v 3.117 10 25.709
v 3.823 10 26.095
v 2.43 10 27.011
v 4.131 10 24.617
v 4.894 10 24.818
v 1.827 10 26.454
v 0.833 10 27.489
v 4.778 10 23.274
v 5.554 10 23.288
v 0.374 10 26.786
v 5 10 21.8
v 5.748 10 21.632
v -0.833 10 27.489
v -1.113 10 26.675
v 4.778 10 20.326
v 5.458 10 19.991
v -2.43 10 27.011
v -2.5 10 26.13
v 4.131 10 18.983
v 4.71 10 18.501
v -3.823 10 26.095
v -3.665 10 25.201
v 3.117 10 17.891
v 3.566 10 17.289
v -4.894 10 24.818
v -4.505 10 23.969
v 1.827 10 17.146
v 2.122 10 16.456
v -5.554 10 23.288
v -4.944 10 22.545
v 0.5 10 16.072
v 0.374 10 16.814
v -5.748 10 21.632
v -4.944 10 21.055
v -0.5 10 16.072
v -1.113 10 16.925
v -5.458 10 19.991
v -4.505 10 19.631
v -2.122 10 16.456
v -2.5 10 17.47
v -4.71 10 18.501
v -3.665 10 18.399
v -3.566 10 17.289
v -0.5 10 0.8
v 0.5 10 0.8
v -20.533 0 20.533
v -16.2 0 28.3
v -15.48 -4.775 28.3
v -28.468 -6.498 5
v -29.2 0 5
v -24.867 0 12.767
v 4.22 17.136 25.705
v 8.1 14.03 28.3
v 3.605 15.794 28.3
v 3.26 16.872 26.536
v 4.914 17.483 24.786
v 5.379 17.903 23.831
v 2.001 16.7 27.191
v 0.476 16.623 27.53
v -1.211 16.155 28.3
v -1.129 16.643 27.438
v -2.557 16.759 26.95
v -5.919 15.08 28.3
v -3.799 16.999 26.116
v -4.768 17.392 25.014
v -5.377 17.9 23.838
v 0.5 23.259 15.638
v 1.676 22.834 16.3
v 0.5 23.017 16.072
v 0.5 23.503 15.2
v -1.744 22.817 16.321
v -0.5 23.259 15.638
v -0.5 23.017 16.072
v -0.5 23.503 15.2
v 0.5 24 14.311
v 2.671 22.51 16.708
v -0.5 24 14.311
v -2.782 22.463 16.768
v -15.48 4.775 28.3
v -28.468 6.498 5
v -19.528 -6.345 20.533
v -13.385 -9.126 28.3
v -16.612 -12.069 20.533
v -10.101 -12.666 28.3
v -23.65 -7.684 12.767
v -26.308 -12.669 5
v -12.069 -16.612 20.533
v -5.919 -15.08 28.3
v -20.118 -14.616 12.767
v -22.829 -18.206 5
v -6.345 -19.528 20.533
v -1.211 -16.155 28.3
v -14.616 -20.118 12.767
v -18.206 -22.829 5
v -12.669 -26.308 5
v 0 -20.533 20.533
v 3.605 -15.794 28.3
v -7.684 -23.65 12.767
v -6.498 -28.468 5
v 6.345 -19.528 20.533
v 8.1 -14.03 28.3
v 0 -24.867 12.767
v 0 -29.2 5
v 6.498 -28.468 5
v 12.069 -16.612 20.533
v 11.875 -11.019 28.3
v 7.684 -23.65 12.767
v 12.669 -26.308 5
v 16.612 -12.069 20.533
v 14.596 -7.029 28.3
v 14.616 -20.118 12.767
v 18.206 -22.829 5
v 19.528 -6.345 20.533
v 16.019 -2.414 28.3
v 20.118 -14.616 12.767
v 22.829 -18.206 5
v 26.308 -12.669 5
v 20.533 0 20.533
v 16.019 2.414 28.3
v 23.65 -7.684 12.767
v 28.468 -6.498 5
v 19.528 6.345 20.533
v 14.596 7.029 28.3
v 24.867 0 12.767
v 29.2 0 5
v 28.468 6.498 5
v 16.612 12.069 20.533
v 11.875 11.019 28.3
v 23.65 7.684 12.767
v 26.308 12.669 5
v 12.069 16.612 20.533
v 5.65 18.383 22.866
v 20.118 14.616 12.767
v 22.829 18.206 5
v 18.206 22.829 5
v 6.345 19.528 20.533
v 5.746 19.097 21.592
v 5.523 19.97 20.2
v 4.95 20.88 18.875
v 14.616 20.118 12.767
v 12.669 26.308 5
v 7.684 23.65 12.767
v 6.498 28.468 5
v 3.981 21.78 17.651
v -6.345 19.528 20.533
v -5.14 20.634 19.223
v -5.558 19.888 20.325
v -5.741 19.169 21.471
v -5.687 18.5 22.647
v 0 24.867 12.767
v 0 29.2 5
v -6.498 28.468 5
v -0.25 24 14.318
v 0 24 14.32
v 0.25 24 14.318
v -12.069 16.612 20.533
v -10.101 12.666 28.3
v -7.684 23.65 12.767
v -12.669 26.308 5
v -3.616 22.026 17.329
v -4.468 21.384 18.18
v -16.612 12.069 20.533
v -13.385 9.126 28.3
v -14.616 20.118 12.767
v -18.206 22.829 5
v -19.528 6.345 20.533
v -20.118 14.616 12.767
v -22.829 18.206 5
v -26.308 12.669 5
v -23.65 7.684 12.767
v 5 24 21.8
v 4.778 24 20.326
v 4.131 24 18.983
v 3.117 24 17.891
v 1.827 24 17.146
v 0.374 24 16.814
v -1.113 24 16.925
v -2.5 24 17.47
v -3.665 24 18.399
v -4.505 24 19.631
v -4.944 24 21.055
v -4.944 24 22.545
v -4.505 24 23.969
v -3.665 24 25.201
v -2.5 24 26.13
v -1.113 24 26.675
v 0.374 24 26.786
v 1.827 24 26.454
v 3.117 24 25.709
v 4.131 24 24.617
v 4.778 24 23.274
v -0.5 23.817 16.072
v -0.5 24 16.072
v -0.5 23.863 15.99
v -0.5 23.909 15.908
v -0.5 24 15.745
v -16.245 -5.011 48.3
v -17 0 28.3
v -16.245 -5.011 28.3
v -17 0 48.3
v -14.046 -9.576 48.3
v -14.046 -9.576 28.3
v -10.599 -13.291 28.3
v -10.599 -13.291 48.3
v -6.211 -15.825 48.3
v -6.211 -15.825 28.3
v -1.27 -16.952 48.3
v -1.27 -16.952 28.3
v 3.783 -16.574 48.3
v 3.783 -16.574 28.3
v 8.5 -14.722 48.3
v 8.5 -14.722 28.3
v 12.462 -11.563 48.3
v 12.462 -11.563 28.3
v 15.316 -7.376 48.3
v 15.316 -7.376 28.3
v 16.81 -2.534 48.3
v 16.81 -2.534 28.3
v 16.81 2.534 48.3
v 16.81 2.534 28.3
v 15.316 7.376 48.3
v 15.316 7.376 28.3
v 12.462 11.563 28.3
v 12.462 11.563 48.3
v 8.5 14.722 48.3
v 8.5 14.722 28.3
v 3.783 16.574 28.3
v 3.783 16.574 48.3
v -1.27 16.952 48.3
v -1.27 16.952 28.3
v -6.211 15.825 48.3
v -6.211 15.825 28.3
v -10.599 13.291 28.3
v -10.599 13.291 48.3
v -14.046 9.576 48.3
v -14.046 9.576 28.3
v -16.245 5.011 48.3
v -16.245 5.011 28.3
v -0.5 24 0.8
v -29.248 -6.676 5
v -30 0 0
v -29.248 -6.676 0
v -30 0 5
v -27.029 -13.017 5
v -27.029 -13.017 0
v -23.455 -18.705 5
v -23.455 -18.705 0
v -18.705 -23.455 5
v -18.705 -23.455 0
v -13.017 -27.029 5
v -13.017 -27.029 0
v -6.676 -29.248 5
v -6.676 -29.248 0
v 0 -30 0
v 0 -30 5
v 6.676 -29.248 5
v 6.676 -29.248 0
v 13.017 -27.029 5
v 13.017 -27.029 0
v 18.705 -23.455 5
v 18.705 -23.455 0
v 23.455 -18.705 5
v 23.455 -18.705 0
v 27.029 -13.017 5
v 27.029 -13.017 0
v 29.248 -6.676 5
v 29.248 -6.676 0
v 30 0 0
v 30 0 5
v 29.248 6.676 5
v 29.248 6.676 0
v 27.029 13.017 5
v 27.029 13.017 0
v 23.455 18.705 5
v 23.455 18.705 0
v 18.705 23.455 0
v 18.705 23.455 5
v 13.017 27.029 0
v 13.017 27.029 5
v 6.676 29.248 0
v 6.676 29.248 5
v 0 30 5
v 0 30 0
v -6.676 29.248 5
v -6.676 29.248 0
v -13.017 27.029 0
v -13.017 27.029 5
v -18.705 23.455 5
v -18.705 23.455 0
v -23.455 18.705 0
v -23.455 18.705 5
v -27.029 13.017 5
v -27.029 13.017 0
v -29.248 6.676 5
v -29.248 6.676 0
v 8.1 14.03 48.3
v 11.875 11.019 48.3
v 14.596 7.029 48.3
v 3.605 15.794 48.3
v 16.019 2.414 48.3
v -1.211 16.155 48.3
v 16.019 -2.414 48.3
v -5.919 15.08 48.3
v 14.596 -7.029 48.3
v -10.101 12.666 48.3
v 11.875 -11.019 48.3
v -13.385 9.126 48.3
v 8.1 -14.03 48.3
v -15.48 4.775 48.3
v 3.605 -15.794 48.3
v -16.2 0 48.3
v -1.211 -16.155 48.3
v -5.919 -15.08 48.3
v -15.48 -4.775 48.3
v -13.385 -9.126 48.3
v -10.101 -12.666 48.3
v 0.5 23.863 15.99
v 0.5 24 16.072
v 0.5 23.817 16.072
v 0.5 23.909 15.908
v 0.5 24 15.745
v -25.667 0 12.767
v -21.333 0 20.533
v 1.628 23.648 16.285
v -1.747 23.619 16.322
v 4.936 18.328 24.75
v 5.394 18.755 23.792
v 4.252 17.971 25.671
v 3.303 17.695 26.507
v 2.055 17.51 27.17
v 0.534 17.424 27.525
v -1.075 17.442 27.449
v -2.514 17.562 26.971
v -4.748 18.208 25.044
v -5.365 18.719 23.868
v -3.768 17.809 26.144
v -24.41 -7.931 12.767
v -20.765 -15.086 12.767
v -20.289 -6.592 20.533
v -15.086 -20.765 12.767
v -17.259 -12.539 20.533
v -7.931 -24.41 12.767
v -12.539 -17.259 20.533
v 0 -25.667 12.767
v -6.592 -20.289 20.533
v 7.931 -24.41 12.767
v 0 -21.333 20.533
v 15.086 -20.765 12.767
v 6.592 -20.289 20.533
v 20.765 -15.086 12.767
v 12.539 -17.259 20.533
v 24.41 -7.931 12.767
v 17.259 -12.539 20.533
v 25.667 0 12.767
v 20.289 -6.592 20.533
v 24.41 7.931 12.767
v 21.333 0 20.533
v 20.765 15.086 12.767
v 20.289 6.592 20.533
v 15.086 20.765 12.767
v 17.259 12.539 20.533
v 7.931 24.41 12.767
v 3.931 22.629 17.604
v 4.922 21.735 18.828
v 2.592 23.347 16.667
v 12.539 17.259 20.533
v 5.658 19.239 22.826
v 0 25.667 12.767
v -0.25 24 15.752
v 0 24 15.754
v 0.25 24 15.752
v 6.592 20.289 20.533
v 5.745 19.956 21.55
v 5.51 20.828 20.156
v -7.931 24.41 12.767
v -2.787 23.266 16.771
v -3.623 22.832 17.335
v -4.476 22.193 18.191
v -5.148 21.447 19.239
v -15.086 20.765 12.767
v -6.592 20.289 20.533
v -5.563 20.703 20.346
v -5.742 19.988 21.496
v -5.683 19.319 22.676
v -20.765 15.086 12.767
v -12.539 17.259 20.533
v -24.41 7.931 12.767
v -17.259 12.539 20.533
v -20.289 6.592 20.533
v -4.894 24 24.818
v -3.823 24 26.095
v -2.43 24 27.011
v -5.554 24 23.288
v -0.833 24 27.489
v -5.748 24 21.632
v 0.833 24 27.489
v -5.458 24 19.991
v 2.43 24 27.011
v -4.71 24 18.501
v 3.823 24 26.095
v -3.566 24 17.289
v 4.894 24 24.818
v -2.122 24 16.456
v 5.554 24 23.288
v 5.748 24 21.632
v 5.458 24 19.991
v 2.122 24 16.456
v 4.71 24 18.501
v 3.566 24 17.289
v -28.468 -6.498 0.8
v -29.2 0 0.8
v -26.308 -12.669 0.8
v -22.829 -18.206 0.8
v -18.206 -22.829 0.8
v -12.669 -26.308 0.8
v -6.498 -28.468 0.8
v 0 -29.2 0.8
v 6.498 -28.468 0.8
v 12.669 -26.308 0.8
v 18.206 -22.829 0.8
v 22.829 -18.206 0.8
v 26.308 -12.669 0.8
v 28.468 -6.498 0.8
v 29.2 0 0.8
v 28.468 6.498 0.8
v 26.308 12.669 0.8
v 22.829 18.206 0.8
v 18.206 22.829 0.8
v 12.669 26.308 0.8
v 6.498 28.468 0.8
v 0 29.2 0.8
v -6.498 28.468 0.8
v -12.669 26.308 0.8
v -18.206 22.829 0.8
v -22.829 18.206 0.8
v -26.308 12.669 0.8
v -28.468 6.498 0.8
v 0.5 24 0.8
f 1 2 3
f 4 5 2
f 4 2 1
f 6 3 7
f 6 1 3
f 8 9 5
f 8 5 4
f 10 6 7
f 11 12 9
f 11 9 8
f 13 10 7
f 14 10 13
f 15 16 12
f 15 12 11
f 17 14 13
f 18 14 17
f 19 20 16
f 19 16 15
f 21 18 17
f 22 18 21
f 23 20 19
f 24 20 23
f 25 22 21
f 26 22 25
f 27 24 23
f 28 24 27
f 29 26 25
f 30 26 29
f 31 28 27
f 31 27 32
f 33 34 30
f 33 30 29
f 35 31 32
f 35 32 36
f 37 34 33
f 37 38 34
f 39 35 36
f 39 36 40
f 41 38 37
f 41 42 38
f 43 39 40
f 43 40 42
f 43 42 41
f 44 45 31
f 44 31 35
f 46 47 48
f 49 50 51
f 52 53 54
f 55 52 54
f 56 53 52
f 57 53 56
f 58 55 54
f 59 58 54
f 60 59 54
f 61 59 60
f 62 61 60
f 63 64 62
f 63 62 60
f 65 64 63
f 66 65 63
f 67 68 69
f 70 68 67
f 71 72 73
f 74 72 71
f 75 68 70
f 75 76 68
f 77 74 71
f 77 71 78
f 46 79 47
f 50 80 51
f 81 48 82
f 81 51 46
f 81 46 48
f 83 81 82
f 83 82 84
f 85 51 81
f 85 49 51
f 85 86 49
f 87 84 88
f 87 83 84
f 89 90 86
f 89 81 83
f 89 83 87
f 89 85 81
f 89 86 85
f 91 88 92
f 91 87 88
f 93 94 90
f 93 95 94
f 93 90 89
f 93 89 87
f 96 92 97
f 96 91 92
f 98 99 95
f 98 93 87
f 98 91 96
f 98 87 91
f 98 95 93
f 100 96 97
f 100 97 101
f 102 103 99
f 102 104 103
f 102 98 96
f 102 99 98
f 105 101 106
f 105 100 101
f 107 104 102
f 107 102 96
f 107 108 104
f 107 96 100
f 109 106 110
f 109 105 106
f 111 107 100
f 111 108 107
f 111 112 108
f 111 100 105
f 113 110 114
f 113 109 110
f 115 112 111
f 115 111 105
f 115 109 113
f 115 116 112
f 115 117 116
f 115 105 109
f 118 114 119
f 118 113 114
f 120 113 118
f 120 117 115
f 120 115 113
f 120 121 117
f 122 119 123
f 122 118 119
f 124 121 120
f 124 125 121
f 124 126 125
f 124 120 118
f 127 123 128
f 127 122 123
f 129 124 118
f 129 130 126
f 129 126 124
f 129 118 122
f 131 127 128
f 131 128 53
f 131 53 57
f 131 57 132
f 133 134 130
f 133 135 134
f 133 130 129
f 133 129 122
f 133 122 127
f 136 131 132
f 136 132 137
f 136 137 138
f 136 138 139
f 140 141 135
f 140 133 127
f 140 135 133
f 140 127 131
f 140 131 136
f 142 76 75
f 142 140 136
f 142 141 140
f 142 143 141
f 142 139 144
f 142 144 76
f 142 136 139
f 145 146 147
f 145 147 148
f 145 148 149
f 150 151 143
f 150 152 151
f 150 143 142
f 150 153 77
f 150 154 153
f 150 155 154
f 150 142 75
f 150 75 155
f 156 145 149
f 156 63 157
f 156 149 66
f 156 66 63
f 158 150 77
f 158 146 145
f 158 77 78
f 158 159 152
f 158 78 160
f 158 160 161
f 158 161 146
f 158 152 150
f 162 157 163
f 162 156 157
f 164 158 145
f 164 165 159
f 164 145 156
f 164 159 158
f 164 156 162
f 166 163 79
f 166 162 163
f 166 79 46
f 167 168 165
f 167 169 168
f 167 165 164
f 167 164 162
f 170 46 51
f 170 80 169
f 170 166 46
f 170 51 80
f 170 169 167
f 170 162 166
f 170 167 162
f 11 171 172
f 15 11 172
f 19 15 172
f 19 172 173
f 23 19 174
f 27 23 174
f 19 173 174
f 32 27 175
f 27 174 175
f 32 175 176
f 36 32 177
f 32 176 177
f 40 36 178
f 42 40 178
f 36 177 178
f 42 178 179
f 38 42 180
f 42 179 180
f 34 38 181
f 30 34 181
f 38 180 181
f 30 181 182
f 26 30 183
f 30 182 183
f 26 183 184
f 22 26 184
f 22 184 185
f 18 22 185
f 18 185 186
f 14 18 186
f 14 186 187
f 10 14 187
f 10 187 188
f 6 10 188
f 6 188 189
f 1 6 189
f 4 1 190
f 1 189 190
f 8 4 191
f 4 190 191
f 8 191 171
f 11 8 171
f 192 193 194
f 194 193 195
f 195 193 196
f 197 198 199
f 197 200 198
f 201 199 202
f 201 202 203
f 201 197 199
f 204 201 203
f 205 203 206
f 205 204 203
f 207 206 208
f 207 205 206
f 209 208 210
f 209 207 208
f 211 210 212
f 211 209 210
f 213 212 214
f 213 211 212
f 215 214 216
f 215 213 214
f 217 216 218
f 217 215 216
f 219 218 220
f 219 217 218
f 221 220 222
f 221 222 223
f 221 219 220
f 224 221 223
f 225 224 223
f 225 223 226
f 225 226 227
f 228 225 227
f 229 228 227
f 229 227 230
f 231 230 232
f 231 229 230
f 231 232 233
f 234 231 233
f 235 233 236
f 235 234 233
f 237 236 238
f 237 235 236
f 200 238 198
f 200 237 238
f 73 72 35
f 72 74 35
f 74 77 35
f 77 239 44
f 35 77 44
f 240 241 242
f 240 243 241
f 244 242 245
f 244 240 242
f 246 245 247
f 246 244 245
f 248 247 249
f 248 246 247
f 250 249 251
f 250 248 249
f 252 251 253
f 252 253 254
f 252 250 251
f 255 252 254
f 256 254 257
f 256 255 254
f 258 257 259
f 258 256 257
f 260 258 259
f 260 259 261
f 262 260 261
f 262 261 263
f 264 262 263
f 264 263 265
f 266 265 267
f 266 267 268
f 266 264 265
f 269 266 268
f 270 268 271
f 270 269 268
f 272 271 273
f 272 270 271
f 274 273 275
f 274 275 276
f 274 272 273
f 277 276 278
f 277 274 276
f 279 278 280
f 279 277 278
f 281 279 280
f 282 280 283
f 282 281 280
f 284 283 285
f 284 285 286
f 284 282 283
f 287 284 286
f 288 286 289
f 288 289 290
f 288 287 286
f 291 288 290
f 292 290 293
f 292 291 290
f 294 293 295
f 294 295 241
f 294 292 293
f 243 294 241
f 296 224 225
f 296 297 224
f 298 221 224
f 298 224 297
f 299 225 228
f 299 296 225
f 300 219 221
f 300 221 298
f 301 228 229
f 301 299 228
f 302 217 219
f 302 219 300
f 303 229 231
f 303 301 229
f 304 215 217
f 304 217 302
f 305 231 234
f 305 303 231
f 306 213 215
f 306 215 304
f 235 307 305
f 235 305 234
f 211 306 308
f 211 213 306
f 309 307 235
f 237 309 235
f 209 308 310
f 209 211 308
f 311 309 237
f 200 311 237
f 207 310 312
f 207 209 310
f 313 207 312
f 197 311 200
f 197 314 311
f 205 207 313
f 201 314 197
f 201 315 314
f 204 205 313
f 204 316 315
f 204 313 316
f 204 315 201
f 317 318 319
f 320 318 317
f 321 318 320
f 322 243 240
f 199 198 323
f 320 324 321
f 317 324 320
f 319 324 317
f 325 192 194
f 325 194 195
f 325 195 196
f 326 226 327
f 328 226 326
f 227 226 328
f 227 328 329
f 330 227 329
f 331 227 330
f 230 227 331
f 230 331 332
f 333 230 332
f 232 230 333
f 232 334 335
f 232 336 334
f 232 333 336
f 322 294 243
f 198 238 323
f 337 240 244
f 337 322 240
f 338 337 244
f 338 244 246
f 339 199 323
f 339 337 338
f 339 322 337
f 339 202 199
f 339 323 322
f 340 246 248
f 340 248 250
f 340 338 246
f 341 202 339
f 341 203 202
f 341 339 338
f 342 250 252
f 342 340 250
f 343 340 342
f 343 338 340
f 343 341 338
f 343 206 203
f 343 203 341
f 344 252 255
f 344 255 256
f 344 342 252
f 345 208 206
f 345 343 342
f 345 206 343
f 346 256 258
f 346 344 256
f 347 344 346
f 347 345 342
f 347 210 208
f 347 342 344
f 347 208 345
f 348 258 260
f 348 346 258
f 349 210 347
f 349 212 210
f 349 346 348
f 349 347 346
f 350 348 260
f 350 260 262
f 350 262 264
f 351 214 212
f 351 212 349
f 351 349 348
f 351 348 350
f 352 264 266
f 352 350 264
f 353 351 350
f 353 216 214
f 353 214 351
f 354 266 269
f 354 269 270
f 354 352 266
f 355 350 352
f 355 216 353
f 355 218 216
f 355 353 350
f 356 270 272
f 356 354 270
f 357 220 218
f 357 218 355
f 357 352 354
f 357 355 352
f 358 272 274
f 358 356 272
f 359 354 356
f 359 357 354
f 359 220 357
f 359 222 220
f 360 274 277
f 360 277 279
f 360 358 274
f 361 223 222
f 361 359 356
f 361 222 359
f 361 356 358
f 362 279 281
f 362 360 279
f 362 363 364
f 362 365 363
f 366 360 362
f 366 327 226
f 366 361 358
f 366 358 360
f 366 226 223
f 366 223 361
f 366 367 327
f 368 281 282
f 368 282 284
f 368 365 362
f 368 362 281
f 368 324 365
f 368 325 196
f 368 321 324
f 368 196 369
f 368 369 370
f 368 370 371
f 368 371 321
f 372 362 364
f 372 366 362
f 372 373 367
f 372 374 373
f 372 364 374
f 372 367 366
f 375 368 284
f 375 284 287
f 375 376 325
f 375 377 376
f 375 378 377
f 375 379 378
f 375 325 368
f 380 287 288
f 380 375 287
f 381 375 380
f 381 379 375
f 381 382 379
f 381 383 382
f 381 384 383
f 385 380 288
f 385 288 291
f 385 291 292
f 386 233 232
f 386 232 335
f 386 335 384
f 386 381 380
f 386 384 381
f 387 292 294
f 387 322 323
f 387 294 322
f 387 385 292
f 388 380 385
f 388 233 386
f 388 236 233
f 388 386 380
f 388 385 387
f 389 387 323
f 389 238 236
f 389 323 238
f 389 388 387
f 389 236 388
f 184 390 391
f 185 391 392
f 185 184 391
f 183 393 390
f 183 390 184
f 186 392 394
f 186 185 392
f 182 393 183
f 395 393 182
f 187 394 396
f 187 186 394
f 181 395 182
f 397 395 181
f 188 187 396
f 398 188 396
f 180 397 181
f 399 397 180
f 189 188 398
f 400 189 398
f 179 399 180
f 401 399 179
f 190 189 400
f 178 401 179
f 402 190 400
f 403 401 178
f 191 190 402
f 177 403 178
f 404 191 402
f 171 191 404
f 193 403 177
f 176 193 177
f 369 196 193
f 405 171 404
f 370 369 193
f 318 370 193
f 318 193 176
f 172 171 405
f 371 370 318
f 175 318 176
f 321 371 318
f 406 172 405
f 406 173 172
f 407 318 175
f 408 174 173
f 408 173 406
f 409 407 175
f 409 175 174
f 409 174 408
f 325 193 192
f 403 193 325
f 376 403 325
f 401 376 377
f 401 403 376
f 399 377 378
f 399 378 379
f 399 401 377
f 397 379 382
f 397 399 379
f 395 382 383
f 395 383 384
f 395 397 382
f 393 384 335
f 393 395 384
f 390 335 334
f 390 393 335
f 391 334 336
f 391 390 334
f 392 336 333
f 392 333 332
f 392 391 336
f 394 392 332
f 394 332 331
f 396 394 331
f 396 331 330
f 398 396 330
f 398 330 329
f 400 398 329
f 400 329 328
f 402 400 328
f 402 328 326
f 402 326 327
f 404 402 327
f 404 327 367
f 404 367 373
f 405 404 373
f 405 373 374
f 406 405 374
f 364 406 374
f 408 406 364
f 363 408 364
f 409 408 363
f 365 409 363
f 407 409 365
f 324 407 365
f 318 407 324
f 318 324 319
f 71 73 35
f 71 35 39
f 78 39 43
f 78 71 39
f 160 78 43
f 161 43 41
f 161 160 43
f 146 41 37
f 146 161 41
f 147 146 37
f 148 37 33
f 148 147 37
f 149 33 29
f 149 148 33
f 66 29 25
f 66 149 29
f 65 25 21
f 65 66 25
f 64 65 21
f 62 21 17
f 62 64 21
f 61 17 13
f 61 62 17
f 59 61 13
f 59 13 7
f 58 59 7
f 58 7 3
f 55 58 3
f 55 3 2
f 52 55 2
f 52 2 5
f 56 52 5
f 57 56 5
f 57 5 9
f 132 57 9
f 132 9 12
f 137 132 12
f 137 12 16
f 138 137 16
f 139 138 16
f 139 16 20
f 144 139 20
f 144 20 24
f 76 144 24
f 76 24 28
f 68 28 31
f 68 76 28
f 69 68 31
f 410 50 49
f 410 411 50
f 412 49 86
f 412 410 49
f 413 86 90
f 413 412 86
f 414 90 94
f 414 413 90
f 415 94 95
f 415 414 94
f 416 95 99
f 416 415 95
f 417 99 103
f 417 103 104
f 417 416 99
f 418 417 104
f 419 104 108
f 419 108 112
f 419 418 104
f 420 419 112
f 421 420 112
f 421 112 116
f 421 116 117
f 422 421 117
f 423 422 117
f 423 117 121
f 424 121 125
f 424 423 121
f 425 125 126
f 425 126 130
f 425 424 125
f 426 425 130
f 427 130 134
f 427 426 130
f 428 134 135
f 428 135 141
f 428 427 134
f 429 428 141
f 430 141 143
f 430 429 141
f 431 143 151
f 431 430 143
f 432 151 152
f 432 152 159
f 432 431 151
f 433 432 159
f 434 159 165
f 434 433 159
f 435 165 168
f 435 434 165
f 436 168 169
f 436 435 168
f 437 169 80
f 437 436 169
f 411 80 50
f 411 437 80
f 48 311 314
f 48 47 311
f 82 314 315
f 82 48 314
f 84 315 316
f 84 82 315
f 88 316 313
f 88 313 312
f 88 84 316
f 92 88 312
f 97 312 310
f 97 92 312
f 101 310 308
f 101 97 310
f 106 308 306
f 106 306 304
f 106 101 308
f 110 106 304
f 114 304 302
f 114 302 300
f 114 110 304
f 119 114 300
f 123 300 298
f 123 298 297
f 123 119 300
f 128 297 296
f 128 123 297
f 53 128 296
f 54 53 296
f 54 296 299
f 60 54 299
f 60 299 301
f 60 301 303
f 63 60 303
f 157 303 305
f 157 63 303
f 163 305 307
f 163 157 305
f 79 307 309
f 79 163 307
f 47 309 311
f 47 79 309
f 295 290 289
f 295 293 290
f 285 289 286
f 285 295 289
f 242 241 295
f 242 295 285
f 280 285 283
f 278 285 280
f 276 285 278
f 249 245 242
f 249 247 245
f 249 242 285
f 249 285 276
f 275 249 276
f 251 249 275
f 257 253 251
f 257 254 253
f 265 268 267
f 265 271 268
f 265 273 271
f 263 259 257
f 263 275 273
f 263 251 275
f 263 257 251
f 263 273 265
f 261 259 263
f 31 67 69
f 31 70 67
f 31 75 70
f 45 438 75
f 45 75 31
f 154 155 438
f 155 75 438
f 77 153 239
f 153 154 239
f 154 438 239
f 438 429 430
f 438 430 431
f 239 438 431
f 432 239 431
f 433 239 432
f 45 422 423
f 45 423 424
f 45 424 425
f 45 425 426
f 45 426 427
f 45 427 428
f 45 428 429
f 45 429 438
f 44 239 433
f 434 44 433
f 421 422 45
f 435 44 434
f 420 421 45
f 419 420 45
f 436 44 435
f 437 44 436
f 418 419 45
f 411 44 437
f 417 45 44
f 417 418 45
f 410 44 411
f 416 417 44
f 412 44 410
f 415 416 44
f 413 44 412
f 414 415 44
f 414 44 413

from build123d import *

# Parameters (mm, degrees)
SKETCH012_W     = 1
SKETCH012_H     = 14
PAD004_DEPTH    = 21
SKETCH013_R     = 5.75
PAD005_DEPTH    = 14
SKETCH014_R     = 5
POCKET006_DEPTH = 14


with BuildPart() as part:
    # Sketch011 → Revolution (revolve)
    with BuildSketch(Plane.XZ):
        Polygon((0, 0), (-30, 0), (-30, 5), (-17, 28.3), (-17, 48.3), (-16.2, 48.3), (-16.2, 28.3), (-29.2, 5), (-29.2, 0.8), (0, 0.8), align=None)
    revolve(axis=Axis((0, 0, 0), (0, 0, 1)))

    # Sketch012 (on Face9 of Revolution) → Pad004 (new body)
    with BuildSketch(Plane(origin=(0, 0, 0.8), x_dir=(-1, 0, 0), z_dir=(0, 0, 1))):
        with Locations((0, -17)):
            Rectangle(SKETCH012_W, SKETCH012_H)
    extrude(amount=PAD004_DEPTH)

    # Sketch013 (on Face8 of Pad004) → Pad005 (join)
    with BuildSketch(Plane(origin=(0, 24, 0), x_dir=(1, 0, 0), z_dir=(0, 1, 0))):
        with Locations((0, -21.8)):
            Circle(SKETCH013_R)
    extrude(amount=-PAD005_DEPTH)

    # Sketch014 (on Face15 of Pad005) → Pocket006 (cut)
    with BuildSketch(Plane(origin=(0, 24, 0), x_dir=(1, 0, 0), z_dir=(0, 1, 0))):
        with Locations((0, -21.8)):
            Circle(SKETCH014_R)
    extrude(amount=-POCKET006_DEPTH, mode=Mode.SUBTRACT)


solid = part.part
